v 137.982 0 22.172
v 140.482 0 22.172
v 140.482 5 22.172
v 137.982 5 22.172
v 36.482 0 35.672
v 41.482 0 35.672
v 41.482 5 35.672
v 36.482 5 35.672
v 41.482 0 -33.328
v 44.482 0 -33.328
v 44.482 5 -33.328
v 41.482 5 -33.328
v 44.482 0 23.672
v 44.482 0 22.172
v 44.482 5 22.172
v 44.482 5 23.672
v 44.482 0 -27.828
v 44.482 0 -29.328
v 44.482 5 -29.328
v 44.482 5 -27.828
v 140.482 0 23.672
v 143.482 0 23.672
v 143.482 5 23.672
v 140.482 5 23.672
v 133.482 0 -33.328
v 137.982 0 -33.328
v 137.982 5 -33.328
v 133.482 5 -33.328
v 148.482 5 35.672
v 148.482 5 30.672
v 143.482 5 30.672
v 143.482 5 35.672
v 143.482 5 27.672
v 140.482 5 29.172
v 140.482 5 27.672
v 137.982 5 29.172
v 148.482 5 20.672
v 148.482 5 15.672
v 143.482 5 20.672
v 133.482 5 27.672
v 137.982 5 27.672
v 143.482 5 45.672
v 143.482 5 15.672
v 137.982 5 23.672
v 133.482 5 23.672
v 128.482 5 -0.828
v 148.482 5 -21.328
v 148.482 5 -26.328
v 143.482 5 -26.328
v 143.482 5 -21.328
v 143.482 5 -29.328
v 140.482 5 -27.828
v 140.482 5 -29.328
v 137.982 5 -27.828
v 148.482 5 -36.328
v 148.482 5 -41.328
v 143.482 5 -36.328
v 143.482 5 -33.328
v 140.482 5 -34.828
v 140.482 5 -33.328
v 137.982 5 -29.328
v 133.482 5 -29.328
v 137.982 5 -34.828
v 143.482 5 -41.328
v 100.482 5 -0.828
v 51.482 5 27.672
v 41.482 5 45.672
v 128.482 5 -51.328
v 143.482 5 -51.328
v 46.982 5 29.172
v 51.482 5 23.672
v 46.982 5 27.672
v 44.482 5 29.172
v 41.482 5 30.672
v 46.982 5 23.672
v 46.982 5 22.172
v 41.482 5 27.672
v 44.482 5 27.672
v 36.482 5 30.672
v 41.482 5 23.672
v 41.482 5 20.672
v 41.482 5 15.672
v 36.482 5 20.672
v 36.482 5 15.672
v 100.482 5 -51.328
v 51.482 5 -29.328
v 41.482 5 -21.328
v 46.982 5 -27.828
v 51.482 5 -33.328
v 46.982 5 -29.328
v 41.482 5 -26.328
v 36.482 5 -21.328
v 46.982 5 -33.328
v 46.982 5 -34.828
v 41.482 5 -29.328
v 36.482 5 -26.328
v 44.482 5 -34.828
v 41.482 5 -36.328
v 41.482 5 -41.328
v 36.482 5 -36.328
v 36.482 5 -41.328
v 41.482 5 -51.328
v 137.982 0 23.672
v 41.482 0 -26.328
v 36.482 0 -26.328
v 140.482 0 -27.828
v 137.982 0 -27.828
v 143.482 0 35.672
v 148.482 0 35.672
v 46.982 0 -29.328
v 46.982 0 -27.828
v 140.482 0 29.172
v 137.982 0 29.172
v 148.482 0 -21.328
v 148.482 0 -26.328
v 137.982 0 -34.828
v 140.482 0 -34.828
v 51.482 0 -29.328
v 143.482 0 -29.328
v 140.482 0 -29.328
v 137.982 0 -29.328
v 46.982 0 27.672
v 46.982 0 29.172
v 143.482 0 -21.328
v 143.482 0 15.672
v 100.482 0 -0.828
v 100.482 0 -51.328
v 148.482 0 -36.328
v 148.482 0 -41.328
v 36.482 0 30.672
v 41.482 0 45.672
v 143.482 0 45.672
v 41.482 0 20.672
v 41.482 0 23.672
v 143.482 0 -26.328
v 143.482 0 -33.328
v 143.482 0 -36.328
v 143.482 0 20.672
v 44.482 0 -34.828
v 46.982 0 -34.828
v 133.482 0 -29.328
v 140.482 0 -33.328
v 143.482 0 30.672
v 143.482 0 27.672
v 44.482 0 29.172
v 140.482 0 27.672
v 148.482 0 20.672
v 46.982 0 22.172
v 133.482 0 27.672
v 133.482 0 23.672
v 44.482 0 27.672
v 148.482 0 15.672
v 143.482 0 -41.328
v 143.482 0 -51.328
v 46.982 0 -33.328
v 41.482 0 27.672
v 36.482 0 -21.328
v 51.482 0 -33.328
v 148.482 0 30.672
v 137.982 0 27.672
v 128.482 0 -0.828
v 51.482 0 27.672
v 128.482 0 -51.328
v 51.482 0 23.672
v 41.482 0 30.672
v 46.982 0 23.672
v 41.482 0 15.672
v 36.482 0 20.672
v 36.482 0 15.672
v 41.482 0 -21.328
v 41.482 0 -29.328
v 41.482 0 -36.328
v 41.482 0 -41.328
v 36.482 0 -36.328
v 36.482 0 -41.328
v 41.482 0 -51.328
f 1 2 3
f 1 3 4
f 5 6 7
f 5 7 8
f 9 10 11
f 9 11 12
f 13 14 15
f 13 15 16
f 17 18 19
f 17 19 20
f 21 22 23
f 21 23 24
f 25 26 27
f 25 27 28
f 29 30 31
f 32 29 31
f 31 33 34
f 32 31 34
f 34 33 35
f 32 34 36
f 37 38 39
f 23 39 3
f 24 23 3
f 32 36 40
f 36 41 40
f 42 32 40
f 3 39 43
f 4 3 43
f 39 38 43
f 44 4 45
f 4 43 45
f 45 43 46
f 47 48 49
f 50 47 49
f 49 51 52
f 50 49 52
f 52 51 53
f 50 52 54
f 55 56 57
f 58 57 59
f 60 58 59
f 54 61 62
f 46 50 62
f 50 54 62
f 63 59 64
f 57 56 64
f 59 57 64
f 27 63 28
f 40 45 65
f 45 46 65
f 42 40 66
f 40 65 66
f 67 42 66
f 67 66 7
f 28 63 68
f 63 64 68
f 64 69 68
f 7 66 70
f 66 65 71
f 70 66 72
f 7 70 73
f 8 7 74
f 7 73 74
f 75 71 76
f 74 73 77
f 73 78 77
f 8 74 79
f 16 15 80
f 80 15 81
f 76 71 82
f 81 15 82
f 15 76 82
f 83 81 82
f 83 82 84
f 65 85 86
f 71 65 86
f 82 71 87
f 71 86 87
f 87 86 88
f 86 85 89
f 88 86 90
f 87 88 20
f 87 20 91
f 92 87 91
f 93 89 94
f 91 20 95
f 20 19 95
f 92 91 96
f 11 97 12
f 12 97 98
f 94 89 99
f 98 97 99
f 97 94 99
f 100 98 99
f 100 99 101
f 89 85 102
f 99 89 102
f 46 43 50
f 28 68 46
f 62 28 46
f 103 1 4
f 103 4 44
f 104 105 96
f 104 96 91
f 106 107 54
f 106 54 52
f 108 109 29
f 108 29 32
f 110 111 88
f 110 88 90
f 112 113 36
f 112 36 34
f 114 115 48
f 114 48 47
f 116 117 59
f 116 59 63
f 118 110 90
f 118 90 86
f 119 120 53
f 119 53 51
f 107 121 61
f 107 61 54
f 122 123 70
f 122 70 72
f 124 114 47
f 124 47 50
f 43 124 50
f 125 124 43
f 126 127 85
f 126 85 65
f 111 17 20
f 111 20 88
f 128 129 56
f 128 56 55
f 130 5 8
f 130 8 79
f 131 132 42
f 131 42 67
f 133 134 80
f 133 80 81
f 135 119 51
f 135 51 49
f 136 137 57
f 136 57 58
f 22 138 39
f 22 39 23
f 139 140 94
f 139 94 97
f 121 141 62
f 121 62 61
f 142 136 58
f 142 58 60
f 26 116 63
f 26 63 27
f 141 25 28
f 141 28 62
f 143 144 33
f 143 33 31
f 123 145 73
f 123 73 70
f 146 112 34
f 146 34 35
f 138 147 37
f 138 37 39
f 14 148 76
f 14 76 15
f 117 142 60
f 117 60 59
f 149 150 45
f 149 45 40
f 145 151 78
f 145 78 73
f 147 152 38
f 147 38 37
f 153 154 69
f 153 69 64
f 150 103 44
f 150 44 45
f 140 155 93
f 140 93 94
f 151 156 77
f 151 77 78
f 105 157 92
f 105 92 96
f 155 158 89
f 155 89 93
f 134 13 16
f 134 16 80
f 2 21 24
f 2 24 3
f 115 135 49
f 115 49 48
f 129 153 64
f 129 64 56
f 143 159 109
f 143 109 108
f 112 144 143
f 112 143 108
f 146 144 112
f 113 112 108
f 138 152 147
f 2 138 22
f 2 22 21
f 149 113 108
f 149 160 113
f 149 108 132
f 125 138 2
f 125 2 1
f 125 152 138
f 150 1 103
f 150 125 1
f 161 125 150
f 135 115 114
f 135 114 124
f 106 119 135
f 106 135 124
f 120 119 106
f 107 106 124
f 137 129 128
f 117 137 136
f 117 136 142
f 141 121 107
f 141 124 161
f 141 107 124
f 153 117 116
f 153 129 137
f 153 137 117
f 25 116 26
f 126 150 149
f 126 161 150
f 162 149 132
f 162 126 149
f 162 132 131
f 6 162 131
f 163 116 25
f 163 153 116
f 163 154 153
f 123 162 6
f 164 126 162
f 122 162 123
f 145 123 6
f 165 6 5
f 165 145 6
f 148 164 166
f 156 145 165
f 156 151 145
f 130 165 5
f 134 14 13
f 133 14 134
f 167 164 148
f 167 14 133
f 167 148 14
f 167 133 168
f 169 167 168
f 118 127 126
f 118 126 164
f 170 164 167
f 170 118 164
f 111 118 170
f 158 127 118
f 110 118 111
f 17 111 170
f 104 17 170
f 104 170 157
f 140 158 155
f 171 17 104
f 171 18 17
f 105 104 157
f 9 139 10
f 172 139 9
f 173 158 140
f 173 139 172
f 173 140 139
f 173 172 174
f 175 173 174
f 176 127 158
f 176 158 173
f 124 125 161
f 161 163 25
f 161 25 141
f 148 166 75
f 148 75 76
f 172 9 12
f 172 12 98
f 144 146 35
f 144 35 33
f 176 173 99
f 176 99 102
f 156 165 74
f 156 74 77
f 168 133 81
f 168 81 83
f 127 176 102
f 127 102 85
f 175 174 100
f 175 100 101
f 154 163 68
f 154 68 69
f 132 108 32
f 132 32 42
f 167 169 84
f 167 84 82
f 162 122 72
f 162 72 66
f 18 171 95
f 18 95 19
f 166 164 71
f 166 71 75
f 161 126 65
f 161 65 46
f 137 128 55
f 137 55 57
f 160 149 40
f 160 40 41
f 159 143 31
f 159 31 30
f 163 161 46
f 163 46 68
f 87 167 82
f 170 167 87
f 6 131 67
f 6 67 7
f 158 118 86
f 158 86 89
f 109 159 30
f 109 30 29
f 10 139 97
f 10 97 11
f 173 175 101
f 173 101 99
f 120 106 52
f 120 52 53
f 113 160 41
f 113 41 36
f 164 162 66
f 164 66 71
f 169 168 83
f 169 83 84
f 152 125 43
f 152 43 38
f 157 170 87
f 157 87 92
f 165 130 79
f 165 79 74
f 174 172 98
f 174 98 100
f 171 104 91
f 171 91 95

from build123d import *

# Parameters (mm, degrees)
BOSS_EXTRUDE2_DEPTH = 5


with BuildPart() as part:
    # Sketch2 → Boss-Extrude2 (new body)
    with BuildSketch(Plane(origin=(0, 0, 0), x_dir=(1, 0, 0), z_dir=(0, 1, 0))):
        Polygon((143.481880544, 36.328109734), (143.481880544, 33.328109734), (140.481880544, 33.328109734), (140.481880544, 34.828109734), (137.981880544, 34.828109734), (137.981880544, 33.328109734), (133.481880544, 33.328109734), (133.481880544, 29.328109734), (137.981880544, 29.328109734), (137.981880544, 27.828109734), (140.481880544, 27.828109734), (140.481880544, 29.328109734), (143.481880544, 29.328109734), (143.481880544, 26.328109734), (148.481880544, 26.328109734), (148.481880544, 21.328109734), (143.481880544, 21.328109734), (143.481880544, -15.671890266), (148.481880544, -15.671890266), (148.481880544, -20.671890266), (143.481880544, -20.671890266), (143.481880544, -23.671890266), (140.481880544, -23.671890266), (140.481880544, -22.171890266), (137.981880544, -22.171890266), (137.981880544, -23.671890266), (133.481880544, -23.671890266), (133.481880544, -27.671890266), (137.981880544, -27.671890266), (137.981880544, -29.171890266), (140.481880544, -29.171890266), (140.481880544, -27.671890266), (143.481880544, -27.671890266), (143.481880544, -30.671890266), (148.481880544, -30.671890266), (148.481880544, -35.671890266), (143.481880544, -35.671890266), (143.481880544, -45.671890266), (41.481880544, -45.671890266), (41.481880544, -35.671890266), (36.481880544, -35.671890266), (36.481880544, -30.671890266), (41.481880544, -30.671890266), (41.481880544, -27.671890266), (44.481880544, -27.671890266), (44.481880544, -29.171890266), (46.981880544, -29.171890266), (46.981880544, -27.671890266), (51.481880544, -27.671890266), (51.481880544, -23.671890266), (46.981880544, -23.671890266), (46.981880544, -22.171890266), (44.481880544, -22.171890266), (44.481880544, -23.671890266), (41.481880544, -23.671890266), (41.481880544, -20.671890266), (36.481880544, -20.671890266), (36.481880544, -15.671890266), (41.481880544, -15.671890266), (41.481880544, 21.328109734), (36.481880544, 21.328109734), (36.481880544, 26.328109734), (41.481880544, 26.328109734), (41.481880544, 29.328109734), (44.481880544, 29.328109734), (44.481880544, 27.828109734), (46.981880544, 27.828109734), (46.981880544, 29.328109734), (51.481880544, 29.328109734), (51.481880544, 33.328109734), (46.981880544, 33.328109734), (46.981880544, 34.828109734), (44.481880544, 34.828109734), (44.481880544, 33.328109734), (41.481880544, 33.328109734), (41.481880544, 36.328109734), (36.481880544, 36.328109734), (36.481880544, 41.328109734), (41.481880544, 41.328109734), (41.481880544, 51.328109734), (100.481880544, 51.328109734), (100.481880544, 0.828109734), (128.481880544, 0.828109734), (128.481880544, 51.328109734), (143.481880544, 51.328109734), (143.481880544, 41.328109734), (148.481880544, 41.328109734), (148.481880544, 36.328109734), align=None)
    extrude(amount=BOSS_EXTRUDE2_DEPTH)


solid = part.part
